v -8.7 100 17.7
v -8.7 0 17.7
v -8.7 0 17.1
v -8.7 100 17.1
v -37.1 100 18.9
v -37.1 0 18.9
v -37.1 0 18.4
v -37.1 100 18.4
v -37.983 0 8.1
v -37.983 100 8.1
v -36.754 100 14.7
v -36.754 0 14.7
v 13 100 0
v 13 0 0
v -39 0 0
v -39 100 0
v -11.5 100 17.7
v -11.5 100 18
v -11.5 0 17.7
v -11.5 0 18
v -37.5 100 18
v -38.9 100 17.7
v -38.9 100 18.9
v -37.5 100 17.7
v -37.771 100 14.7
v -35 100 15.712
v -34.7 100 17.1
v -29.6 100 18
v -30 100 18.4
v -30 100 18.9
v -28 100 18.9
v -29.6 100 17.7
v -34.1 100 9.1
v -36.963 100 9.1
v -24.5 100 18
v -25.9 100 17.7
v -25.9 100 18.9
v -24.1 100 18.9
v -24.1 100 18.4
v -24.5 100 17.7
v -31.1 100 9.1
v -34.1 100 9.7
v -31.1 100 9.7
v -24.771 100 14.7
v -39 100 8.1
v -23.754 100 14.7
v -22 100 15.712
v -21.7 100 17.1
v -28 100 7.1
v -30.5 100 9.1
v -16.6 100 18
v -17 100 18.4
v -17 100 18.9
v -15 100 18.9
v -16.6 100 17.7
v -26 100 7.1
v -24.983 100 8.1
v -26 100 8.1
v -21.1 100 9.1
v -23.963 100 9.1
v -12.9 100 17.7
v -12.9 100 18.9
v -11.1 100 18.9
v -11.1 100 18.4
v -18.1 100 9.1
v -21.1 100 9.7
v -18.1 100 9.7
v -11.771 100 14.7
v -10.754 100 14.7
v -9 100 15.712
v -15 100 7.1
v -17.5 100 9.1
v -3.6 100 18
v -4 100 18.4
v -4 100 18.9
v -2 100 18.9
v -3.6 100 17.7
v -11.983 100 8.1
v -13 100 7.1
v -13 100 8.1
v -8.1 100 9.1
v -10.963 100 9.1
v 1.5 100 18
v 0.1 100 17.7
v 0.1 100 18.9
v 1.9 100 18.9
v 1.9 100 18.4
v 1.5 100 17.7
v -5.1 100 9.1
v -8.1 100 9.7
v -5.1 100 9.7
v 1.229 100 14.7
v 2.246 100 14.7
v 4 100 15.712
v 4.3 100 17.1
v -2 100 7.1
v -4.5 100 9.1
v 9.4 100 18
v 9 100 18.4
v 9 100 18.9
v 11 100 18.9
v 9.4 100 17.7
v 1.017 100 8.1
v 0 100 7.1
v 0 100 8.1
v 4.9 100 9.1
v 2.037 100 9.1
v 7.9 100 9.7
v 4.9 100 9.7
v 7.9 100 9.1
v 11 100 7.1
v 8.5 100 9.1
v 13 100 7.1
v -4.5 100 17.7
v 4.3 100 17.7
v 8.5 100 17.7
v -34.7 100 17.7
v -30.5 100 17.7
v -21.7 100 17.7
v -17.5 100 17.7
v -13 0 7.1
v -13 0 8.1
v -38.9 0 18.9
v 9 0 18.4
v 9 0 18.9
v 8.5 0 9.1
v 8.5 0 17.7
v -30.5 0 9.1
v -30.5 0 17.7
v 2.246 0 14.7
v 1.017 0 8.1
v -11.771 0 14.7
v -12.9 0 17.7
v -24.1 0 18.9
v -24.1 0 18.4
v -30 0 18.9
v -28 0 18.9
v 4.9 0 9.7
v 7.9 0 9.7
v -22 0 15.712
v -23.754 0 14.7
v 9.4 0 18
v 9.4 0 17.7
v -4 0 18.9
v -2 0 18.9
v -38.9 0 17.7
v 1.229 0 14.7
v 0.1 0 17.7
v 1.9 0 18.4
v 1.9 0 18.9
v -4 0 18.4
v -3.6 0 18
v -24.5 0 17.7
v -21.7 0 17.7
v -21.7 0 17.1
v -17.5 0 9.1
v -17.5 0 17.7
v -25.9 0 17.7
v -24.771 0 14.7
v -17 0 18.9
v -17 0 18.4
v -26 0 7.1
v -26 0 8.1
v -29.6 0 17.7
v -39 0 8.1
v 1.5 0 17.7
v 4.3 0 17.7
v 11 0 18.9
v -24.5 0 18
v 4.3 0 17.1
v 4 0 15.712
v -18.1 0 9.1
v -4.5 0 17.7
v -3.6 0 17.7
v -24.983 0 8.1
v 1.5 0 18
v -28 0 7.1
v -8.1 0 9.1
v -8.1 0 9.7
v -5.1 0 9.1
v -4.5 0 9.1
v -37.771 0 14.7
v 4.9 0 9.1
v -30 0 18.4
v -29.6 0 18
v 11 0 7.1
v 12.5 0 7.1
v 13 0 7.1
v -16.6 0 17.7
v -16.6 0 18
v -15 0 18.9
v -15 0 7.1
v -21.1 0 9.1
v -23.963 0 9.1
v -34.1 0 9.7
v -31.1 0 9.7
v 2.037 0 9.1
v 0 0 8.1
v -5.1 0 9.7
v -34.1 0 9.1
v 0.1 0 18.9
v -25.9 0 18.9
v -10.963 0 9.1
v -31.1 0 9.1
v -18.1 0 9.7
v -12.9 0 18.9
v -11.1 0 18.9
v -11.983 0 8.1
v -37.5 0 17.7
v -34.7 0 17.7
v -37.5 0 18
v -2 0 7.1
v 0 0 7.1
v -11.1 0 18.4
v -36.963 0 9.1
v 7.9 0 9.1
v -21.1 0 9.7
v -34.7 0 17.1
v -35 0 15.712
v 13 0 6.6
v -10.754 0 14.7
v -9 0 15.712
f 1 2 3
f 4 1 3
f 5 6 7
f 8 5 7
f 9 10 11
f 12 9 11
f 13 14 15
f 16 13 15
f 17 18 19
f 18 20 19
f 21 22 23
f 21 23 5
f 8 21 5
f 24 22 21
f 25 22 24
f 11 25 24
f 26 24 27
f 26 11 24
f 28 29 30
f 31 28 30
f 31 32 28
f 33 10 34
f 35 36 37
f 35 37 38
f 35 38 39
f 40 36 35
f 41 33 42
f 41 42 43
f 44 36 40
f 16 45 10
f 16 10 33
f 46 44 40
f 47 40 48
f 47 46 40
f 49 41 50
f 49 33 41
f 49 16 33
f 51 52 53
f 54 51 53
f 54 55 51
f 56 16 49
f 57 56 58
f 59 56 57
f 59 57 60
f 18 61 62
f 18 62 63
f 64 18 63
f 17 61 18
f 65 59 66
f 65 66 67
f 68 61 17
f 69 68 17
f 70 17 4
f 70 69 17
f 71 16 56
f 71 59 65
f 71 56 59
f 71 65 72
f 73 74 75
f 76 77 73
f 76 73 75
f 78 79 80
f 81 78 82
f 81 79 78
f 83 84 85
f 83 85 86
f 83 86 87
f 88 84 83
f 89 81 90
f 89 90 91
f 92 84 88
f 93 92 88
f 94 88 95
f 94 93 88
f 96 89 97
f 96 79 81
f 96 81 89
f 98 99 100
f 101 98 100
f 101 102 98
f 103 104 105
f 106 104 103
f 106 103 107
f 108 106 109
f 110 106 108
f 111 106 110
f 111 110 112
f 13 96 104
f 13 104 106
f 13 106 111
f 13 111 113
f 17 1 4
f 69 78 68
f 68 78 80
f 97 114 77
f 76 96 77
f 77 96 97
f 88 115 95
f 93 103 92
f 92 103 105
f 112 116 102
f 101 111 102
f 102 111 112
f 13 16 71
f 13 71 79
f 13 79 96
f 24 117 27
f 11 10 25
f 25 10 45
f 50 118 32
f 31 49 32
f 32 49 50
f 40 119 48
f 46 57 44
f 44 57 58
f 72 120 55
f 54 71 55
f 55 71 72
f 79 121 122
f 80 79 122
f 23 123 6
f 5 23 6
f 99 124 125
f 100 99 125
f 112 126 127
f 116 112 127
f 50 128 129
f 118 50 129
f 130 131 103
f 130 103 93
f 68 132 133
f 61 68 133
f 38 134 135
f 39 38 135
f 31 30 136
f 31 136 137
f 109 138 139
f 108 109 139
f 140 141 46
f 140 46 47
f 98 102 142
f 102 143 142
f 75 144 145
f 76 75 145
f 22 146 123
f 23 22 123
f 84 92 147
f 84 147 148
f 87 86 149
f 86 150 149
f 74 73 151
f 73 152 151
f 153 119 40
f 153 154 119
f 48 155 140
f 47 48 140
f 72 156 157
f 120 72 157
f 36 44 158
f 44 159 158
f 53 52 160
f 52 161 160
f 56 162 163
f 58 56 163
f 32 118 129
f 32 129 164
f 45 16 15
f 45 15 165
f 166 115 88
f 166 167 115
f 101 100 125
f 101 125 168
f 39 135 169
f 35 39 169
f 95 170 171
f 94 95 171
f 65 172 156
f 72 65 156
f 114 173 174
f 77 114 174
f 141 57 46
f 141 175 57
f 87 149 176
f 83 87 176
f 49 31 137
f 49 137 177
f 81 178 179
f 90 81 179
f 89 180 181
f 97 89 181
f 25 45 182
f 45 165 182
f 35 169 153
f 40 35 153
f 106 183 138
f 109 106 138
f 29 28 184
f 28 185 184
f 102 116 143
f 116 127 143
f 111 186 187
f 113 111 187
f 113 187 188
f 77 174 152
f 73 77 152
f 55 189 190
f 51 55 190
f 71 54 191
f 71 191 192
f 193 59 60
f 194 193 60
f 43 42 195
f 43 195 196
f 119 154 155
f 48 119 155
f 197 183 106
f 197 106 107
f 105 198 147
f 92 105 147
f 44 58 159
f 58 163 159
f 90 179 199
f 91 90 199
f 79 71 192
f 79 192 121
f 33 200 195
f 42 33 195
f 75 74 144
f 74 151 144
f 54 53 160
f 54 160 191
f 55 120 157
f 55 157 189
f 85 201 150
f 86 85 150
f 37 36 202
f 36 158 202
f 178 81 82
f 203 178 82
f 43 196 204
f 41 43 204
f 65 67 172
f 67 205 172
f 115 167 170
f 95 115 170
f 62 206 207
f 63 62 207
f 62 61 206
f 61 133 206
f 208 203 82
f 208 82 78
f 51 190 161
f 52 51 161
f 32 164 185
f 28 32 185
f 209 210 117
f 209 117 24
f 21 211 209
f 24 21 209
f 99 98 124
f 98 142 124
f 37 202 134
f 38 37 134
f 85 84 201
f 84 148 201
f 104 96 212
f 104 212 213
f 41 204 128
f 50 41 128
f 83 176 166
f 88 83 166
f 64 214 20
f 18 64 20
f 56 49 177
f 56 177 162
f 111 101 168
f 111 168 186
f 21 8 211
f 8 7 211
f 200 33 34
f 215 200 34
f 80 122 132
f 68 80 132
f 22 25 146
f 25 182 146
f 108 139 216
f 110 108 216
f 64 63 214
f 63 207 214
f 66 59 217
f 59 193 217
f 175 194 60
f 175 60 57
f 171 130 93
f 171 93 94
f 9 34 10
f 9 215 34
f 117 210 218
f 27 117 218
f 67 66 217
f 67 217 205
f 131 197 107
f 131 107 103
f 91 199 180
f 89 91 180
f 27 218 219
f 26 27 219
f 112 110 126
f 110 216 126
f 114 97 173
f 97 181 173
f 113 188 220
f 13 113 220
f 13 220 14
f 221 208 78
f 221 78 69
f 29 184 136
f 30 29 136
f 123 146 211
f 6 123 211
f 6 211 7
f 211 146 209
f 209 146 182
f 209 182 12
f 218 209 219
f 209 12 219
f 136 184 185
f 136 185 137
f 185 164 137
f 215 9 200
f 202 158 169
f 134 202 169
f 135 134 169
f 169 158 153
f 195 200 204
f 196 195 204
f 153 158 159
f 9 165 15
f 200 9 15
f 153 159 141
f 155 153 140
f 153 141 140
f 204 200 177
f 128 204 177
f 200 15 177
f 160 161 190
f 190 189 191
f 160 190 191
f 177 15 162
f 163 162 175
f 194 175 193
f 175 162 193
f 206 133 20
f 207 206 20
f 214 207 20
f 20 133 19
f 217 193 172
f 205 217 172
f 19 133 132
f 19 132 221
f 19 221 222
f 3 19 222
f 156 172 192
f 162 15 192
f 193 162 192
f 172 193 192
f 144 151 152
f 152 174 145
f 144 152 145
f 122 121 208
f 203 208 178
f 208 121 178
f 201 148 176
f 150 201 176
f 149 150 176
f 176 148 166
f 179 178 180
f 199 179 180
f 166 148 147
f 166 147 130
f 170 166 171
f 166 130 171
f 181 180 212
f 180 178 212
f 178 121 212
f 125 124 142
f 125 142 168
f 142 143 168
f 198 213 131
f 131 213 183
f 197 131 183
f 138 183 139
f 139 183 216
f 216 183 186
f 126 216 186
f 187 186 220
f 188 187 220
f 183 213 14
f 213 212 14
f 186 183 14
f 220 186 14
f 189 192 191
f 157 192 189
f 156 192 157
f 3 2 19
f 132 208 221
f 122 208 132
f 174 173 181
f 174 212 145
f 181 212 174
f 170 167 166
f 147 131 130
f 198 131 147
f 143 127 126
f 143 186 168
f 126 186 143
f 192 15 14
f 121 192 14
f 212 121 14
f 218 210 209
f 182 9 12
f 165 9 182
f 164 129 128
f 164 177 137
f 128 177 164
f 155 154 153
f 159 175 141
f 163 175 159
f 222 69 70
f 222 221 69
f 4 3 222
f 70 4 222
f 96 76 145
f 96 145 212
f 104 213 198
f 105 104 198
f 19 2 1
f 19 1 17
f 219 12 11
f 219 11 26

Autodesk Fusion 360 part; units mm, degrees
sketch "Skizze1" plane through (0, 0, 0) normal (0, 1, 0) x (1, 0, 0)
  line L0 (9.4, -17.7) -> (9.4, -18)
  line L1 (8.5, -17.7) -> (9.4, -17.7)
  line L2 (1.2293, -14.7) -> (0.1, -17.7)
  line L3 (4.3, -17.7) -> (4.3, -17.1)
  line L4 (0, -8.1) -> (1.2293, -14.7)
  line L5 (0.1, -18.9) -> (1.9, -18.9)
  line L6 (0.1, -17.7) -> (0.1, -18.9)
  line L7 (1.9, -18.4) -> (1.5, -18)
  line L8 (1.5, -18) -> (1.5, -17.7)
  line L9 (1.9, -18.9) -> (1.9, -18.4)
  line L10 (4.3, -17.1) -> (2.2465, -14.7)
  line L11 (13, 0) -> (0, 0)
  line L12 (9, -18.9) -> (11, -18.9)
  line L13 (0, 0) -> (0, -8.1)
  line L14 (8.5, -9.1) -> (8.5, -17.7)
  line L15 (4.3, -17.7) -> (1.5, -17.7)
  line L16 (11, -18.9) -> (11, -7.1)
  line L17 (9.4, -18) -> (9, -18.4)
  line L18 (9, -18.4) -> (9, -18.9)
  line L19 (4.9, -9.1) -> (2.0366, -9.1)
  line L20 (1.0172, -8.1) -> (2.2465, -14.7)
  line L21 (2.0366, -9.1) -> (1.0172, -8.1)
  line L22 (11, -7.1) -> (13, -7.1)
  line L23 (13, -7.1) -> (13, 0)
  circle A0 centre (12.5, -6.6) radius 0.5
  line L24 (2.2465, -14.7) -> (4, -15.7124)
  line L25 (2.2465, -14.7) -> (2.2465, -9.6844) construction
  line L26 (4.3, -17.1) -> (4, -15.7124)
  line L27 (0.7, -6.388) -> (0.7, -1)
  line L28 (0.7, -1) -> (12.5, -1)
  line L29 (12.5, -1) -> (12.5, -6.7)
  line L30 (12.5, -6.7) -> (10.6, -6.7)
  line L31 (10.6, -8.1) -> (10.6, -6.7)
  line L32 (4.9, -9.1) -> (4.9, -9.7)
  line L33 (4.9, -9.7) -> (7.9, -9.7)
  line L34 (7.9, -9.7) -> (7.9, -9.1)
  line L35 (7.9, -9.1) -> (8.5, -9.1)
  line L36 (8.5, -8.1) -> (10.6, -8.1)
  line L37 (1.7175, -7.3861) -> (0.7, -6.388)
  line L38 (6.9, -8.1) -> (8.5, -8.1)
  line L39 (6.9, -8.7) -> (6.9, -8.1)
  line L40 (5.9, -8.7) -> (6.9, -8.7)
  line L41 (5.9, -8.1) -> (5.9, -8.7)
  line L42 (5.9, -8.1) -> (2.4452, -8.1)
  line L43 (2.4452, -8.1) -> (1.7175, -7.3861)
  dimension "d14" = 7.9
  dimension "d15" = 2.8
  dimension "d16" = 0.9
  dimension "d17" = 17.7
  dimension "d18" = 0.3
  dimension "d21" = 18.9
  dimension "d26" = 35
  dimension "d28" = 1
  dimension "d30" = 150
  dimension "d31" = 0.4
  dimension "d32" = 1.4
  dimension "d33" = 1
  dimension "d34" = 0.6
  dimension "d35" = 3
  dimension "d36" = 45
  dimension "d37" = 45
  dimension "d38" = 0.4
  dimension "d39" = 0.1
  dimension "d42" = 1
  dimension "d94" = 2.5
  dimension "d95" = 0.5
  dimension "d96" = 0.5
  dimension "d97" = 2
  dimension "d98" = 1
  dimension "d105" = 120
  dimension "d106" = 2.5
  dimension "d119" = 8.6
  dimension "d135" = 1
  dimension "d136" = 0.7
  dimension "d137" = 0.5
  dimension "d139" = 0.4
  dimension "d141" = 0.4
  dimension "d142" = 0.6
  dimension "d143" = 0.6
  dimension "d144" = 8
  dimension "d146" = -1
extrude "Extrusion2" add sketch "Skizze1" along normal blind 1 contours A0 L29 L30 | A0 L29 L30
extrude "Extrusion1" add sketch "Skizze1" along normal blind 100
sketch "Skizze6" plane through (0, 0, 17.7) normal (0, 0, 1) x (-1, 0, 0)
  line L0 (-1.5, 0) -> (-4.3, 0)
  line L1 (-4.3, 0) -> (-4.3, -100)
  line L2 (-4.3, -100) -> (-1.5, -100)
  line L3 (-1.5, -100) -> (-1.5, 0)
  circle A0 centre (-3.25, -1.75) radius 0.75
  dimension "d99" = 1.5
  dimension "d100" = 1.75
  dimension "d102" = 1.75
sketch "Skizze4" plane through (0, 0, 0) normal (0, 0, -1) x (0, 1, 0)
  line L0 (0, 13) -> (0, 0)
  line L1 (100, 0) -> (100, 13)
  line L2 (0, 0) -> (0, 13)
  line L3 (0, 0) -> (-10, 0)
  line L4 (-10, 0) -> (-10, 13)
  line L5 (-10, 13) -> (0, 13)
  line L6 (50, 0) -> (50, 17.319) construction
  circle A0 centre (-5, 6.5) radius 1.65
  line L7 (100, 0) -> (110, 0)
  line L8 (100, 0) -> (100, 13)
  line L9 (110, 13) -> (100, 13)
  line L10 (110, 0) -> (110, 13)
  circle A1 centre (105, 6.5) radius 1.65
  line L11 (0, 0) -> (100, 0)
  line L12 (100, 13) -> (0, 13)
  circle A2 centre (105, 6.5) radius 4
  circle A3 centre (-5, 6.5) radius 4
  point P0 (-10, 6.5)
  point P1 (-5, 0)
  point P2 (0, 13)
  dimension "d88" = 3.3
  dimension "d89" = 10
  dimension "d123" = 8
pattern_linear "R-Anordnung1" count 4 spacing 13 along (-1, 0, 0) of "Extrusion1"
equation "Strip_width = 8 mm" comment "check!!! 8, 12, 16, 24 mm"
equation "Strip_hight = 0.3 mm" comment "check!!! default: 0,7; paper strip 0,9mm; plastic strip 0,3mm"
equation "Reference_hight_machine = 18 mm" comment "Pickuphight from table"
equation "Number_Feeders = 4" comment "check!!! Amount of Strips"
equation "Length_Strips = 100 mm" comment "check!!! Strip Length"
equation "Tape_Clearence = 0.1 mm" comment "default 0,05"
equation "TapeSupport_width_HoleSide = 2.8 mm"
equation "TapeSupport_width_NonHoleSide = 0.9 mm"
equation "With_between_feeders = 2 mm"
equation "d14 = Strip_width - Tape_Clearence"
equation "d15 = TapeSupport_width_HoleSide"
equation "d16 = TapeSupport_width_NonHoleSide"
equation "d17 = Reference_hight_machine - Strip_hight"
equation "d18 = Strip_hight"
equation "d21 = Reference_hight_machine + 0.9 mm"
equation "d37 = d36"
equation "d38 = d31"
equation "d39 = Tape_Clearence"
equation "d40 = Length_Strips"
equation "d44 = Number_Feeders"
equation "d46 = -3 mm - Strip_width - With_between_feeders"
equation "width = 3 mm"
equation "d95 = d98 / 2"
equation "d96 = d98 / 2"
equation "d97 = With_between_feeders"
equation "Strip_Pitch = 4 mm"
equation "d102 = d100"
equation "d105 = 30 deg + 90 deg"
equation "Components_max_height = 8 mm" comment "default 8mm"
equation "d141 = d139"
equation "d142 = d143"
equation "d144 = Components_max_height"
